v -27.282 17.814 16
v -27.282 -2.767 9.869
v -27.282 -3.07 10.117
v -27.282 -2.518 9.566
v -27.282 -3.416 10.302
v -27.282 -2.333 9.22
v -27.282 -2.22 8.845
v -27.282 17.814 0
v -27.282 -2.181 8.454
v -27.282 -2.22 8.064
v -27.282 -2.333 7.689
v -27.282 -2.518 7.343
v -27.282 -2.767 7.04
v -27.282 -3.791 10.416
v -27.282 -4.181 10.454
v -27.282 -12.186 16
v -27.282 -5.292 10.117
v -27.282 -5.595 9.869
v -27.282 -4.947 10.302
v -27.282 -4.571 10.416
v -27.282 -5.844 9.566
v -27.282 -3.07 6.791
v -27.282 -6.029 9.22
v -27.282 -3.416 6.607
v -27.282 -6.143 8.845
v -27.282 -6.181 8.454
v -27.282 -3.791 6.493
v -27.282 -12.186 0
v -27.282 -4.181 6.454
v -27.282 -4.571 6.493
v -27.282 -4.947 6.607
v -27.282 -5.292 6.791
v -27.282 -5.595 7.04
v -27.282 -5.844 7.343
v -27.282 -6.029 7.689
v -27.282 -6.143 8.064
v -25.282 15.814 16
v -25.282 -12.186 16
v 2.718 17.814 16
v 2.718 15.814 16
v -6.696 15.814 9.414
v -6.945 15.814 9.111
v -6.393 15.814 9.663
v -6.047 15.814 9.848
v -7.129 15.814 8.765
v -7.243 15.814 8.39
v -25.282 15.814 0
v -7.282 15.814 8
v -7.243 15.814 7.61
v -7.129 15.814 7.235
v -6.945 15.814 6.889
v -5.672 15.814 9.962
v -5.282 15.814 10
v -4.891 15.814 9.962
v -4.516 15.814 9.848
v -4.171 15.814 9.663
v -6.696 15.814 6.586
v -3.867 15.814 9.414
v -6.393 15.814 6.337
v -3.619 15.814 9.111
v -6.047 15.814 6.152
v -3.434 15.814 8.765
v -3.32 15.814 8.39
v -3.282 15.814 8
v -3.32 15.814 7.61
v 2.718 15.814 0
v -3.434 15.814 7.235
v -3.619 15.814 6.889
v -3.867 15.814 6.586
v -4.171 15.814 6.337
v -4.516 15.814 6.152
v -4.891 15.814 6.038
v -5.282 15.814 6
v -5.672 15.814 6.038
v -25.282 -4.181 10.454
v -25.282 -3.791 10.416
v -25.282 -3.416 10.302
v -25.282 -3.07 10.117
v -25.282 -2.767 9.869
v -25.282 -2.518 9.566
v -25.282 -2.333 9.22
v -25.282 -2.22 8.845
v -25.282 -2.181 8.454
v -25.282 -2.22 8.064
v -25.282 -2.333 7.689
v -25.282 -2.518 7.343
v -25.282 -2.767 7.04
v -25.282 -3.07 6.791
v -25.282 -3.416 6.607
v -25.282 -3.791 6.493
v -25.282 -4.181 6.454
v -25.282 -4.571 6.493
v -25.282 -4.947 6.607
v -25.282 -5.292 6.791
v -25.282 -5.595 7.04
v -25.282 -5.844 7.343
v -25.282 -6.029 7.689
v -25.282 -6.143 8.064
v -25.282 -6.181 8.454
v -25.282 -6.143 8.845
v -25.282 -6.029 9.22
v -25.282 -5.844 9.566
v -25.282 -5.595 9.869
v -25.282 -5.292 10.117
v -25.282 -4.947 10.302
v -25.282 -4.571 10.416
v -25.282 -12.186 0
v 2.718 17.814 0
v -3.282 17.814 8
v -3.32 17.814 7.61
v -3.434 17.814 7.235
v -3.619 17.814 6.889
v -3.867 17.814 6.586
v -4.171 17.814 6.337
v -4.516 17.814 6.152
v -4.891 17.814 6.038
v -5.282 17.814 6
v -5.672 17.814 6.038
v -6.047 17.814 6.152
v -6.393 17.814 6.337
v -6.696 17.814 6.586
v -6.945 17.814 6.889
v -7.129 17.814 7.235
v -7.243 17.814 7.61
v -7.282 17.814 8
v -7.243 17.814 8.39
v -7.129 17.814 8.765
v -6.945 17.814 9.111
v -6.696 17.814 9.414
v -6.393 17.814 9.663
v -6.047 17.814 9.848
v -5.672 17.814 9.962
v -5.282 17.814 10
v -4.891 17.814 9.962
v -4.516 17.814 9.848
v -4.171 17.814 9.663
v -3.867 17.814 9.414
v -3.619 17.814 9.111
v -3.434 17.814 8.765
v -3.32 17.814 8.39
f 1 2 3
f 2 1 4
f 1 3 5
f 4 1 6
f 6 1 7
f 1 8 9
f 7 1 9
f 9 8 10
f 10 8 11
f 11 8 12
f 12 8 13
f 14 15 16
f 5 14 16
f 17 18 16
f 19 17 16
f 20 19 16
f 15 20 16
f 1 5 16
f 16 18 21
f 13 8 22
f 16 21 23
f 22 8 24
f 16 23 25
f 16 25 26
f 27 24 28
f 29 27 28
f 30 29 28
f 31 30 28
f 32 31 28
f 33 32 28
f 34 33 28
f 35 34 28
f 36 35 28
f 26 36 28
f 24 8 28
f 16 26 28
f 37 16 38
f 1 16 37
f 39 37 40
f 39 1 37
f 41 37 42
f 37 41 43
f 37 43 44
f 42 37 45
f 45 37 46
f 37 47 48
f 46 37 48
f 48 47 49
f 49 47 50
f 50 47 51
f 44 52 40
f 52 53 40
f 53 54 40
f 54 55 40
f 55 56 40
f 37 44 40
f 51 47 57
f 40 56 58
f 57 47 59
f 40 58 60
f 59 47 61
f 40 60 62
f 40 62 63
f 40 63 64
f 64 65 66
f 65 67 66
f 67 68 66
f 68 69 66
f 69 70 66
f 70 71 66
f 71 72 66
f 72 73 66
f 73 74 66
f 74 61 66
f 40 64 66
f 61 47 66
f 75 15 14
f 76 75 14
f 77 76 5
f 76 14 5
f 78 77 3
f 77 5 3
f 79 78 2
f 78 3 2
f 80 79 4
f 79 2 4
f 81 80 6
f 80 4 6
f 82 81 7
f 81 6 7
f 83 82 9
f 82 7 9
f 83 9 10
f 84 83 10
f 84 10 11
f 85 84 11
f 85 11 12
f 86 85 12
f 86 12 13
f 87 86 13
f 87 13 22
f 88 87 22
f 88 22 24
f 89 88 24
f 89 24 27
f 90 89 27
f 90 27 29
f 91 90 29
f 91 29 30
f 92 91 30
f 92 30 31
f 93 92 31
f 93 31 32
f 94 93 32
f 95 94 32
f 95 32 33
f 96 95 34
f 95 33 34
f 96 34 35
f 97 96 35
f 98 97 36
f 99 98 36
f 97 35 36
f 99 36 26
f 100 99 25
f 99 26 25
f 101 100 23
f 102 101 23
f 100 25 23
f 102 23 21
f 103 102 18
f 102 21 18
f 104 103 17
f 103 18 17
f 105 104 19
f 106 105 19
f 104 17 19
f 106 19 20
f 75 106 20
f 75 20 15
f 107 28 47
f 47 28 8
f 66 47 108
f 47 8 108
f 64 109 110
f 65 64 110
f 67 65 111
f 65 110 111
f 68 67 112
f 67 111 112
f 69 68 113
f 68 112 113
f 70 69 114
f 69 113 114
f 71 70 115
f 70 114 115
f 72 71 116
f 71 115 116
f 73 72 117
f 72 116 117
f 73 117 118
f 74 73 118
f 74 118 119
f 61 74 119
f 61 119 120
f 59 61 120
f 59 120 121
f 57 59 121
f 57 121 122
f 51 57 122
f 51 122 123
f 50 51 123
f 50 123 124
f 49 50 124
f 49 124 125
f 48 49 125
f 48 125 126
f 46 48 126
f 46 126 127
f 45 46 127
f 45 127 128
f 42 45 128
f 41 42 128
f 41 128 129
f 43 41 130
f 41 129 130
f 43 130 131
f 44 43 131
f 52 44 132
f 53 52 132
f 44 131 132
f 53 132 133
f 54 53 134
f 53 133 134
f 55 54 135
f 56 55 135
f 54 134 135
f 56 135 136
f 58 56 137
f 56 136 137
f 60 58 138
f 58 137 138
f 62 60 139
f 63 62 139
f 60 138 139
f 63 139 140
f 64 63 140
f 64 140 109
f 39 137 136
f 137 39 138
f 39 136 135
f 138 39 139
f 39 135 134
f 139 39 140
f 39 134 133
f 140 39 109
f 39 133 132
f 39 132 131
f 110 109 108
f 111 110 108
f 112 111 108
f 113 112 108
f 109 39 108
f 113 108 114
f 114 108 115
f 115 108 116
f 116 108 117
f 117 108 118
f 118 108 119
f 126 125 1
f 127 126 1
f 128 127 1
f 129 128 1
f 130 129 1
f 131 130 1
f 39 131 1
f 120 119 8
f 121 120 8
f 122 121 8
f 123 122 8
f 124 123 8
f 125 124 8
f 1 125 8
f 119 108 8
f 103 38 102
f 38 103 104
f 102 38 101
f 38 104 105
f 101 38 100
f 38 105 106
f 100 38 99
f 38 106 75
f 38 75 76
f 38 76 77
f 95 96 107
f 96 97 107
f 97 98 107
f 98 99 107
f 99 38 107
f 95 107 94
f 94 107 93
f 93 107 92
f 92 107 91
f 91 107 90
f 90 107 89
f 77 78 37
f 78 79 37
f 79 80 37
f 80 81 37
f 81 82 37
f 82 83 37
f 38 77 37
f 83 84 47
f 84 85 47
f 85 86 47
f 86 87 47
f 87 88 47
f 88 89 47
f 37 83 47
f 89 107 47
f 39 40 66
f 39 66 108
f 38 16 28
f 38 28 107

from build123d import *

# Parameters (mm, degrees)
EXTRUDE_1_DEPTH     = 16
SKETCH_2_R          = 2
CUT_EXTRUDE_1_DEPTH = 16
SKETCH_3_R          = 2
CUT_EXTRUDE_2_DEPTH = 16


with BuildPart() as part:
    # 草图1 → 凸台-拉伸1 (new body)
    with BuildSketch(Plane.XY):
        Polygon((-27.281673393, 17.814060708), (-27.281673393, -12.185939292), (-25.281673393, -12.185939292), (-25.281673393, 15.814060708), (2.718326607, 15.814060708), (2.718326607, 17.814060708), align=None)
    extrude(amount=EXTRUDE_1_DEPTH)

    # 草图2 → 切除-拉伸1 (cut)
    with BuildSketch(Plane(origin=(0, 17.814060708, 0), x_dir=(1, 0, 0), z_dir=(0, 1, 0))):
        with Locations((-5.281673393, -8)):
            Circle(SKETCH_2_R)
    extrude(amount=-CUT_EXTRUDE_1_DEPTH, mode=Mode.SUBTRACT)

    # 草图3 → 切除-拉伸2 (cut)
    with BuildSketch(Plane.ZY.offset(27.281673393)):
        with Locations((8.454389853, -4.181246288)):
            Circle(SKETCH_3_R)
    extrude(amount=-CUT_EXTRUDE_2_DEPTH, mode=Mode.SUBTRACT)


solid = part.part
